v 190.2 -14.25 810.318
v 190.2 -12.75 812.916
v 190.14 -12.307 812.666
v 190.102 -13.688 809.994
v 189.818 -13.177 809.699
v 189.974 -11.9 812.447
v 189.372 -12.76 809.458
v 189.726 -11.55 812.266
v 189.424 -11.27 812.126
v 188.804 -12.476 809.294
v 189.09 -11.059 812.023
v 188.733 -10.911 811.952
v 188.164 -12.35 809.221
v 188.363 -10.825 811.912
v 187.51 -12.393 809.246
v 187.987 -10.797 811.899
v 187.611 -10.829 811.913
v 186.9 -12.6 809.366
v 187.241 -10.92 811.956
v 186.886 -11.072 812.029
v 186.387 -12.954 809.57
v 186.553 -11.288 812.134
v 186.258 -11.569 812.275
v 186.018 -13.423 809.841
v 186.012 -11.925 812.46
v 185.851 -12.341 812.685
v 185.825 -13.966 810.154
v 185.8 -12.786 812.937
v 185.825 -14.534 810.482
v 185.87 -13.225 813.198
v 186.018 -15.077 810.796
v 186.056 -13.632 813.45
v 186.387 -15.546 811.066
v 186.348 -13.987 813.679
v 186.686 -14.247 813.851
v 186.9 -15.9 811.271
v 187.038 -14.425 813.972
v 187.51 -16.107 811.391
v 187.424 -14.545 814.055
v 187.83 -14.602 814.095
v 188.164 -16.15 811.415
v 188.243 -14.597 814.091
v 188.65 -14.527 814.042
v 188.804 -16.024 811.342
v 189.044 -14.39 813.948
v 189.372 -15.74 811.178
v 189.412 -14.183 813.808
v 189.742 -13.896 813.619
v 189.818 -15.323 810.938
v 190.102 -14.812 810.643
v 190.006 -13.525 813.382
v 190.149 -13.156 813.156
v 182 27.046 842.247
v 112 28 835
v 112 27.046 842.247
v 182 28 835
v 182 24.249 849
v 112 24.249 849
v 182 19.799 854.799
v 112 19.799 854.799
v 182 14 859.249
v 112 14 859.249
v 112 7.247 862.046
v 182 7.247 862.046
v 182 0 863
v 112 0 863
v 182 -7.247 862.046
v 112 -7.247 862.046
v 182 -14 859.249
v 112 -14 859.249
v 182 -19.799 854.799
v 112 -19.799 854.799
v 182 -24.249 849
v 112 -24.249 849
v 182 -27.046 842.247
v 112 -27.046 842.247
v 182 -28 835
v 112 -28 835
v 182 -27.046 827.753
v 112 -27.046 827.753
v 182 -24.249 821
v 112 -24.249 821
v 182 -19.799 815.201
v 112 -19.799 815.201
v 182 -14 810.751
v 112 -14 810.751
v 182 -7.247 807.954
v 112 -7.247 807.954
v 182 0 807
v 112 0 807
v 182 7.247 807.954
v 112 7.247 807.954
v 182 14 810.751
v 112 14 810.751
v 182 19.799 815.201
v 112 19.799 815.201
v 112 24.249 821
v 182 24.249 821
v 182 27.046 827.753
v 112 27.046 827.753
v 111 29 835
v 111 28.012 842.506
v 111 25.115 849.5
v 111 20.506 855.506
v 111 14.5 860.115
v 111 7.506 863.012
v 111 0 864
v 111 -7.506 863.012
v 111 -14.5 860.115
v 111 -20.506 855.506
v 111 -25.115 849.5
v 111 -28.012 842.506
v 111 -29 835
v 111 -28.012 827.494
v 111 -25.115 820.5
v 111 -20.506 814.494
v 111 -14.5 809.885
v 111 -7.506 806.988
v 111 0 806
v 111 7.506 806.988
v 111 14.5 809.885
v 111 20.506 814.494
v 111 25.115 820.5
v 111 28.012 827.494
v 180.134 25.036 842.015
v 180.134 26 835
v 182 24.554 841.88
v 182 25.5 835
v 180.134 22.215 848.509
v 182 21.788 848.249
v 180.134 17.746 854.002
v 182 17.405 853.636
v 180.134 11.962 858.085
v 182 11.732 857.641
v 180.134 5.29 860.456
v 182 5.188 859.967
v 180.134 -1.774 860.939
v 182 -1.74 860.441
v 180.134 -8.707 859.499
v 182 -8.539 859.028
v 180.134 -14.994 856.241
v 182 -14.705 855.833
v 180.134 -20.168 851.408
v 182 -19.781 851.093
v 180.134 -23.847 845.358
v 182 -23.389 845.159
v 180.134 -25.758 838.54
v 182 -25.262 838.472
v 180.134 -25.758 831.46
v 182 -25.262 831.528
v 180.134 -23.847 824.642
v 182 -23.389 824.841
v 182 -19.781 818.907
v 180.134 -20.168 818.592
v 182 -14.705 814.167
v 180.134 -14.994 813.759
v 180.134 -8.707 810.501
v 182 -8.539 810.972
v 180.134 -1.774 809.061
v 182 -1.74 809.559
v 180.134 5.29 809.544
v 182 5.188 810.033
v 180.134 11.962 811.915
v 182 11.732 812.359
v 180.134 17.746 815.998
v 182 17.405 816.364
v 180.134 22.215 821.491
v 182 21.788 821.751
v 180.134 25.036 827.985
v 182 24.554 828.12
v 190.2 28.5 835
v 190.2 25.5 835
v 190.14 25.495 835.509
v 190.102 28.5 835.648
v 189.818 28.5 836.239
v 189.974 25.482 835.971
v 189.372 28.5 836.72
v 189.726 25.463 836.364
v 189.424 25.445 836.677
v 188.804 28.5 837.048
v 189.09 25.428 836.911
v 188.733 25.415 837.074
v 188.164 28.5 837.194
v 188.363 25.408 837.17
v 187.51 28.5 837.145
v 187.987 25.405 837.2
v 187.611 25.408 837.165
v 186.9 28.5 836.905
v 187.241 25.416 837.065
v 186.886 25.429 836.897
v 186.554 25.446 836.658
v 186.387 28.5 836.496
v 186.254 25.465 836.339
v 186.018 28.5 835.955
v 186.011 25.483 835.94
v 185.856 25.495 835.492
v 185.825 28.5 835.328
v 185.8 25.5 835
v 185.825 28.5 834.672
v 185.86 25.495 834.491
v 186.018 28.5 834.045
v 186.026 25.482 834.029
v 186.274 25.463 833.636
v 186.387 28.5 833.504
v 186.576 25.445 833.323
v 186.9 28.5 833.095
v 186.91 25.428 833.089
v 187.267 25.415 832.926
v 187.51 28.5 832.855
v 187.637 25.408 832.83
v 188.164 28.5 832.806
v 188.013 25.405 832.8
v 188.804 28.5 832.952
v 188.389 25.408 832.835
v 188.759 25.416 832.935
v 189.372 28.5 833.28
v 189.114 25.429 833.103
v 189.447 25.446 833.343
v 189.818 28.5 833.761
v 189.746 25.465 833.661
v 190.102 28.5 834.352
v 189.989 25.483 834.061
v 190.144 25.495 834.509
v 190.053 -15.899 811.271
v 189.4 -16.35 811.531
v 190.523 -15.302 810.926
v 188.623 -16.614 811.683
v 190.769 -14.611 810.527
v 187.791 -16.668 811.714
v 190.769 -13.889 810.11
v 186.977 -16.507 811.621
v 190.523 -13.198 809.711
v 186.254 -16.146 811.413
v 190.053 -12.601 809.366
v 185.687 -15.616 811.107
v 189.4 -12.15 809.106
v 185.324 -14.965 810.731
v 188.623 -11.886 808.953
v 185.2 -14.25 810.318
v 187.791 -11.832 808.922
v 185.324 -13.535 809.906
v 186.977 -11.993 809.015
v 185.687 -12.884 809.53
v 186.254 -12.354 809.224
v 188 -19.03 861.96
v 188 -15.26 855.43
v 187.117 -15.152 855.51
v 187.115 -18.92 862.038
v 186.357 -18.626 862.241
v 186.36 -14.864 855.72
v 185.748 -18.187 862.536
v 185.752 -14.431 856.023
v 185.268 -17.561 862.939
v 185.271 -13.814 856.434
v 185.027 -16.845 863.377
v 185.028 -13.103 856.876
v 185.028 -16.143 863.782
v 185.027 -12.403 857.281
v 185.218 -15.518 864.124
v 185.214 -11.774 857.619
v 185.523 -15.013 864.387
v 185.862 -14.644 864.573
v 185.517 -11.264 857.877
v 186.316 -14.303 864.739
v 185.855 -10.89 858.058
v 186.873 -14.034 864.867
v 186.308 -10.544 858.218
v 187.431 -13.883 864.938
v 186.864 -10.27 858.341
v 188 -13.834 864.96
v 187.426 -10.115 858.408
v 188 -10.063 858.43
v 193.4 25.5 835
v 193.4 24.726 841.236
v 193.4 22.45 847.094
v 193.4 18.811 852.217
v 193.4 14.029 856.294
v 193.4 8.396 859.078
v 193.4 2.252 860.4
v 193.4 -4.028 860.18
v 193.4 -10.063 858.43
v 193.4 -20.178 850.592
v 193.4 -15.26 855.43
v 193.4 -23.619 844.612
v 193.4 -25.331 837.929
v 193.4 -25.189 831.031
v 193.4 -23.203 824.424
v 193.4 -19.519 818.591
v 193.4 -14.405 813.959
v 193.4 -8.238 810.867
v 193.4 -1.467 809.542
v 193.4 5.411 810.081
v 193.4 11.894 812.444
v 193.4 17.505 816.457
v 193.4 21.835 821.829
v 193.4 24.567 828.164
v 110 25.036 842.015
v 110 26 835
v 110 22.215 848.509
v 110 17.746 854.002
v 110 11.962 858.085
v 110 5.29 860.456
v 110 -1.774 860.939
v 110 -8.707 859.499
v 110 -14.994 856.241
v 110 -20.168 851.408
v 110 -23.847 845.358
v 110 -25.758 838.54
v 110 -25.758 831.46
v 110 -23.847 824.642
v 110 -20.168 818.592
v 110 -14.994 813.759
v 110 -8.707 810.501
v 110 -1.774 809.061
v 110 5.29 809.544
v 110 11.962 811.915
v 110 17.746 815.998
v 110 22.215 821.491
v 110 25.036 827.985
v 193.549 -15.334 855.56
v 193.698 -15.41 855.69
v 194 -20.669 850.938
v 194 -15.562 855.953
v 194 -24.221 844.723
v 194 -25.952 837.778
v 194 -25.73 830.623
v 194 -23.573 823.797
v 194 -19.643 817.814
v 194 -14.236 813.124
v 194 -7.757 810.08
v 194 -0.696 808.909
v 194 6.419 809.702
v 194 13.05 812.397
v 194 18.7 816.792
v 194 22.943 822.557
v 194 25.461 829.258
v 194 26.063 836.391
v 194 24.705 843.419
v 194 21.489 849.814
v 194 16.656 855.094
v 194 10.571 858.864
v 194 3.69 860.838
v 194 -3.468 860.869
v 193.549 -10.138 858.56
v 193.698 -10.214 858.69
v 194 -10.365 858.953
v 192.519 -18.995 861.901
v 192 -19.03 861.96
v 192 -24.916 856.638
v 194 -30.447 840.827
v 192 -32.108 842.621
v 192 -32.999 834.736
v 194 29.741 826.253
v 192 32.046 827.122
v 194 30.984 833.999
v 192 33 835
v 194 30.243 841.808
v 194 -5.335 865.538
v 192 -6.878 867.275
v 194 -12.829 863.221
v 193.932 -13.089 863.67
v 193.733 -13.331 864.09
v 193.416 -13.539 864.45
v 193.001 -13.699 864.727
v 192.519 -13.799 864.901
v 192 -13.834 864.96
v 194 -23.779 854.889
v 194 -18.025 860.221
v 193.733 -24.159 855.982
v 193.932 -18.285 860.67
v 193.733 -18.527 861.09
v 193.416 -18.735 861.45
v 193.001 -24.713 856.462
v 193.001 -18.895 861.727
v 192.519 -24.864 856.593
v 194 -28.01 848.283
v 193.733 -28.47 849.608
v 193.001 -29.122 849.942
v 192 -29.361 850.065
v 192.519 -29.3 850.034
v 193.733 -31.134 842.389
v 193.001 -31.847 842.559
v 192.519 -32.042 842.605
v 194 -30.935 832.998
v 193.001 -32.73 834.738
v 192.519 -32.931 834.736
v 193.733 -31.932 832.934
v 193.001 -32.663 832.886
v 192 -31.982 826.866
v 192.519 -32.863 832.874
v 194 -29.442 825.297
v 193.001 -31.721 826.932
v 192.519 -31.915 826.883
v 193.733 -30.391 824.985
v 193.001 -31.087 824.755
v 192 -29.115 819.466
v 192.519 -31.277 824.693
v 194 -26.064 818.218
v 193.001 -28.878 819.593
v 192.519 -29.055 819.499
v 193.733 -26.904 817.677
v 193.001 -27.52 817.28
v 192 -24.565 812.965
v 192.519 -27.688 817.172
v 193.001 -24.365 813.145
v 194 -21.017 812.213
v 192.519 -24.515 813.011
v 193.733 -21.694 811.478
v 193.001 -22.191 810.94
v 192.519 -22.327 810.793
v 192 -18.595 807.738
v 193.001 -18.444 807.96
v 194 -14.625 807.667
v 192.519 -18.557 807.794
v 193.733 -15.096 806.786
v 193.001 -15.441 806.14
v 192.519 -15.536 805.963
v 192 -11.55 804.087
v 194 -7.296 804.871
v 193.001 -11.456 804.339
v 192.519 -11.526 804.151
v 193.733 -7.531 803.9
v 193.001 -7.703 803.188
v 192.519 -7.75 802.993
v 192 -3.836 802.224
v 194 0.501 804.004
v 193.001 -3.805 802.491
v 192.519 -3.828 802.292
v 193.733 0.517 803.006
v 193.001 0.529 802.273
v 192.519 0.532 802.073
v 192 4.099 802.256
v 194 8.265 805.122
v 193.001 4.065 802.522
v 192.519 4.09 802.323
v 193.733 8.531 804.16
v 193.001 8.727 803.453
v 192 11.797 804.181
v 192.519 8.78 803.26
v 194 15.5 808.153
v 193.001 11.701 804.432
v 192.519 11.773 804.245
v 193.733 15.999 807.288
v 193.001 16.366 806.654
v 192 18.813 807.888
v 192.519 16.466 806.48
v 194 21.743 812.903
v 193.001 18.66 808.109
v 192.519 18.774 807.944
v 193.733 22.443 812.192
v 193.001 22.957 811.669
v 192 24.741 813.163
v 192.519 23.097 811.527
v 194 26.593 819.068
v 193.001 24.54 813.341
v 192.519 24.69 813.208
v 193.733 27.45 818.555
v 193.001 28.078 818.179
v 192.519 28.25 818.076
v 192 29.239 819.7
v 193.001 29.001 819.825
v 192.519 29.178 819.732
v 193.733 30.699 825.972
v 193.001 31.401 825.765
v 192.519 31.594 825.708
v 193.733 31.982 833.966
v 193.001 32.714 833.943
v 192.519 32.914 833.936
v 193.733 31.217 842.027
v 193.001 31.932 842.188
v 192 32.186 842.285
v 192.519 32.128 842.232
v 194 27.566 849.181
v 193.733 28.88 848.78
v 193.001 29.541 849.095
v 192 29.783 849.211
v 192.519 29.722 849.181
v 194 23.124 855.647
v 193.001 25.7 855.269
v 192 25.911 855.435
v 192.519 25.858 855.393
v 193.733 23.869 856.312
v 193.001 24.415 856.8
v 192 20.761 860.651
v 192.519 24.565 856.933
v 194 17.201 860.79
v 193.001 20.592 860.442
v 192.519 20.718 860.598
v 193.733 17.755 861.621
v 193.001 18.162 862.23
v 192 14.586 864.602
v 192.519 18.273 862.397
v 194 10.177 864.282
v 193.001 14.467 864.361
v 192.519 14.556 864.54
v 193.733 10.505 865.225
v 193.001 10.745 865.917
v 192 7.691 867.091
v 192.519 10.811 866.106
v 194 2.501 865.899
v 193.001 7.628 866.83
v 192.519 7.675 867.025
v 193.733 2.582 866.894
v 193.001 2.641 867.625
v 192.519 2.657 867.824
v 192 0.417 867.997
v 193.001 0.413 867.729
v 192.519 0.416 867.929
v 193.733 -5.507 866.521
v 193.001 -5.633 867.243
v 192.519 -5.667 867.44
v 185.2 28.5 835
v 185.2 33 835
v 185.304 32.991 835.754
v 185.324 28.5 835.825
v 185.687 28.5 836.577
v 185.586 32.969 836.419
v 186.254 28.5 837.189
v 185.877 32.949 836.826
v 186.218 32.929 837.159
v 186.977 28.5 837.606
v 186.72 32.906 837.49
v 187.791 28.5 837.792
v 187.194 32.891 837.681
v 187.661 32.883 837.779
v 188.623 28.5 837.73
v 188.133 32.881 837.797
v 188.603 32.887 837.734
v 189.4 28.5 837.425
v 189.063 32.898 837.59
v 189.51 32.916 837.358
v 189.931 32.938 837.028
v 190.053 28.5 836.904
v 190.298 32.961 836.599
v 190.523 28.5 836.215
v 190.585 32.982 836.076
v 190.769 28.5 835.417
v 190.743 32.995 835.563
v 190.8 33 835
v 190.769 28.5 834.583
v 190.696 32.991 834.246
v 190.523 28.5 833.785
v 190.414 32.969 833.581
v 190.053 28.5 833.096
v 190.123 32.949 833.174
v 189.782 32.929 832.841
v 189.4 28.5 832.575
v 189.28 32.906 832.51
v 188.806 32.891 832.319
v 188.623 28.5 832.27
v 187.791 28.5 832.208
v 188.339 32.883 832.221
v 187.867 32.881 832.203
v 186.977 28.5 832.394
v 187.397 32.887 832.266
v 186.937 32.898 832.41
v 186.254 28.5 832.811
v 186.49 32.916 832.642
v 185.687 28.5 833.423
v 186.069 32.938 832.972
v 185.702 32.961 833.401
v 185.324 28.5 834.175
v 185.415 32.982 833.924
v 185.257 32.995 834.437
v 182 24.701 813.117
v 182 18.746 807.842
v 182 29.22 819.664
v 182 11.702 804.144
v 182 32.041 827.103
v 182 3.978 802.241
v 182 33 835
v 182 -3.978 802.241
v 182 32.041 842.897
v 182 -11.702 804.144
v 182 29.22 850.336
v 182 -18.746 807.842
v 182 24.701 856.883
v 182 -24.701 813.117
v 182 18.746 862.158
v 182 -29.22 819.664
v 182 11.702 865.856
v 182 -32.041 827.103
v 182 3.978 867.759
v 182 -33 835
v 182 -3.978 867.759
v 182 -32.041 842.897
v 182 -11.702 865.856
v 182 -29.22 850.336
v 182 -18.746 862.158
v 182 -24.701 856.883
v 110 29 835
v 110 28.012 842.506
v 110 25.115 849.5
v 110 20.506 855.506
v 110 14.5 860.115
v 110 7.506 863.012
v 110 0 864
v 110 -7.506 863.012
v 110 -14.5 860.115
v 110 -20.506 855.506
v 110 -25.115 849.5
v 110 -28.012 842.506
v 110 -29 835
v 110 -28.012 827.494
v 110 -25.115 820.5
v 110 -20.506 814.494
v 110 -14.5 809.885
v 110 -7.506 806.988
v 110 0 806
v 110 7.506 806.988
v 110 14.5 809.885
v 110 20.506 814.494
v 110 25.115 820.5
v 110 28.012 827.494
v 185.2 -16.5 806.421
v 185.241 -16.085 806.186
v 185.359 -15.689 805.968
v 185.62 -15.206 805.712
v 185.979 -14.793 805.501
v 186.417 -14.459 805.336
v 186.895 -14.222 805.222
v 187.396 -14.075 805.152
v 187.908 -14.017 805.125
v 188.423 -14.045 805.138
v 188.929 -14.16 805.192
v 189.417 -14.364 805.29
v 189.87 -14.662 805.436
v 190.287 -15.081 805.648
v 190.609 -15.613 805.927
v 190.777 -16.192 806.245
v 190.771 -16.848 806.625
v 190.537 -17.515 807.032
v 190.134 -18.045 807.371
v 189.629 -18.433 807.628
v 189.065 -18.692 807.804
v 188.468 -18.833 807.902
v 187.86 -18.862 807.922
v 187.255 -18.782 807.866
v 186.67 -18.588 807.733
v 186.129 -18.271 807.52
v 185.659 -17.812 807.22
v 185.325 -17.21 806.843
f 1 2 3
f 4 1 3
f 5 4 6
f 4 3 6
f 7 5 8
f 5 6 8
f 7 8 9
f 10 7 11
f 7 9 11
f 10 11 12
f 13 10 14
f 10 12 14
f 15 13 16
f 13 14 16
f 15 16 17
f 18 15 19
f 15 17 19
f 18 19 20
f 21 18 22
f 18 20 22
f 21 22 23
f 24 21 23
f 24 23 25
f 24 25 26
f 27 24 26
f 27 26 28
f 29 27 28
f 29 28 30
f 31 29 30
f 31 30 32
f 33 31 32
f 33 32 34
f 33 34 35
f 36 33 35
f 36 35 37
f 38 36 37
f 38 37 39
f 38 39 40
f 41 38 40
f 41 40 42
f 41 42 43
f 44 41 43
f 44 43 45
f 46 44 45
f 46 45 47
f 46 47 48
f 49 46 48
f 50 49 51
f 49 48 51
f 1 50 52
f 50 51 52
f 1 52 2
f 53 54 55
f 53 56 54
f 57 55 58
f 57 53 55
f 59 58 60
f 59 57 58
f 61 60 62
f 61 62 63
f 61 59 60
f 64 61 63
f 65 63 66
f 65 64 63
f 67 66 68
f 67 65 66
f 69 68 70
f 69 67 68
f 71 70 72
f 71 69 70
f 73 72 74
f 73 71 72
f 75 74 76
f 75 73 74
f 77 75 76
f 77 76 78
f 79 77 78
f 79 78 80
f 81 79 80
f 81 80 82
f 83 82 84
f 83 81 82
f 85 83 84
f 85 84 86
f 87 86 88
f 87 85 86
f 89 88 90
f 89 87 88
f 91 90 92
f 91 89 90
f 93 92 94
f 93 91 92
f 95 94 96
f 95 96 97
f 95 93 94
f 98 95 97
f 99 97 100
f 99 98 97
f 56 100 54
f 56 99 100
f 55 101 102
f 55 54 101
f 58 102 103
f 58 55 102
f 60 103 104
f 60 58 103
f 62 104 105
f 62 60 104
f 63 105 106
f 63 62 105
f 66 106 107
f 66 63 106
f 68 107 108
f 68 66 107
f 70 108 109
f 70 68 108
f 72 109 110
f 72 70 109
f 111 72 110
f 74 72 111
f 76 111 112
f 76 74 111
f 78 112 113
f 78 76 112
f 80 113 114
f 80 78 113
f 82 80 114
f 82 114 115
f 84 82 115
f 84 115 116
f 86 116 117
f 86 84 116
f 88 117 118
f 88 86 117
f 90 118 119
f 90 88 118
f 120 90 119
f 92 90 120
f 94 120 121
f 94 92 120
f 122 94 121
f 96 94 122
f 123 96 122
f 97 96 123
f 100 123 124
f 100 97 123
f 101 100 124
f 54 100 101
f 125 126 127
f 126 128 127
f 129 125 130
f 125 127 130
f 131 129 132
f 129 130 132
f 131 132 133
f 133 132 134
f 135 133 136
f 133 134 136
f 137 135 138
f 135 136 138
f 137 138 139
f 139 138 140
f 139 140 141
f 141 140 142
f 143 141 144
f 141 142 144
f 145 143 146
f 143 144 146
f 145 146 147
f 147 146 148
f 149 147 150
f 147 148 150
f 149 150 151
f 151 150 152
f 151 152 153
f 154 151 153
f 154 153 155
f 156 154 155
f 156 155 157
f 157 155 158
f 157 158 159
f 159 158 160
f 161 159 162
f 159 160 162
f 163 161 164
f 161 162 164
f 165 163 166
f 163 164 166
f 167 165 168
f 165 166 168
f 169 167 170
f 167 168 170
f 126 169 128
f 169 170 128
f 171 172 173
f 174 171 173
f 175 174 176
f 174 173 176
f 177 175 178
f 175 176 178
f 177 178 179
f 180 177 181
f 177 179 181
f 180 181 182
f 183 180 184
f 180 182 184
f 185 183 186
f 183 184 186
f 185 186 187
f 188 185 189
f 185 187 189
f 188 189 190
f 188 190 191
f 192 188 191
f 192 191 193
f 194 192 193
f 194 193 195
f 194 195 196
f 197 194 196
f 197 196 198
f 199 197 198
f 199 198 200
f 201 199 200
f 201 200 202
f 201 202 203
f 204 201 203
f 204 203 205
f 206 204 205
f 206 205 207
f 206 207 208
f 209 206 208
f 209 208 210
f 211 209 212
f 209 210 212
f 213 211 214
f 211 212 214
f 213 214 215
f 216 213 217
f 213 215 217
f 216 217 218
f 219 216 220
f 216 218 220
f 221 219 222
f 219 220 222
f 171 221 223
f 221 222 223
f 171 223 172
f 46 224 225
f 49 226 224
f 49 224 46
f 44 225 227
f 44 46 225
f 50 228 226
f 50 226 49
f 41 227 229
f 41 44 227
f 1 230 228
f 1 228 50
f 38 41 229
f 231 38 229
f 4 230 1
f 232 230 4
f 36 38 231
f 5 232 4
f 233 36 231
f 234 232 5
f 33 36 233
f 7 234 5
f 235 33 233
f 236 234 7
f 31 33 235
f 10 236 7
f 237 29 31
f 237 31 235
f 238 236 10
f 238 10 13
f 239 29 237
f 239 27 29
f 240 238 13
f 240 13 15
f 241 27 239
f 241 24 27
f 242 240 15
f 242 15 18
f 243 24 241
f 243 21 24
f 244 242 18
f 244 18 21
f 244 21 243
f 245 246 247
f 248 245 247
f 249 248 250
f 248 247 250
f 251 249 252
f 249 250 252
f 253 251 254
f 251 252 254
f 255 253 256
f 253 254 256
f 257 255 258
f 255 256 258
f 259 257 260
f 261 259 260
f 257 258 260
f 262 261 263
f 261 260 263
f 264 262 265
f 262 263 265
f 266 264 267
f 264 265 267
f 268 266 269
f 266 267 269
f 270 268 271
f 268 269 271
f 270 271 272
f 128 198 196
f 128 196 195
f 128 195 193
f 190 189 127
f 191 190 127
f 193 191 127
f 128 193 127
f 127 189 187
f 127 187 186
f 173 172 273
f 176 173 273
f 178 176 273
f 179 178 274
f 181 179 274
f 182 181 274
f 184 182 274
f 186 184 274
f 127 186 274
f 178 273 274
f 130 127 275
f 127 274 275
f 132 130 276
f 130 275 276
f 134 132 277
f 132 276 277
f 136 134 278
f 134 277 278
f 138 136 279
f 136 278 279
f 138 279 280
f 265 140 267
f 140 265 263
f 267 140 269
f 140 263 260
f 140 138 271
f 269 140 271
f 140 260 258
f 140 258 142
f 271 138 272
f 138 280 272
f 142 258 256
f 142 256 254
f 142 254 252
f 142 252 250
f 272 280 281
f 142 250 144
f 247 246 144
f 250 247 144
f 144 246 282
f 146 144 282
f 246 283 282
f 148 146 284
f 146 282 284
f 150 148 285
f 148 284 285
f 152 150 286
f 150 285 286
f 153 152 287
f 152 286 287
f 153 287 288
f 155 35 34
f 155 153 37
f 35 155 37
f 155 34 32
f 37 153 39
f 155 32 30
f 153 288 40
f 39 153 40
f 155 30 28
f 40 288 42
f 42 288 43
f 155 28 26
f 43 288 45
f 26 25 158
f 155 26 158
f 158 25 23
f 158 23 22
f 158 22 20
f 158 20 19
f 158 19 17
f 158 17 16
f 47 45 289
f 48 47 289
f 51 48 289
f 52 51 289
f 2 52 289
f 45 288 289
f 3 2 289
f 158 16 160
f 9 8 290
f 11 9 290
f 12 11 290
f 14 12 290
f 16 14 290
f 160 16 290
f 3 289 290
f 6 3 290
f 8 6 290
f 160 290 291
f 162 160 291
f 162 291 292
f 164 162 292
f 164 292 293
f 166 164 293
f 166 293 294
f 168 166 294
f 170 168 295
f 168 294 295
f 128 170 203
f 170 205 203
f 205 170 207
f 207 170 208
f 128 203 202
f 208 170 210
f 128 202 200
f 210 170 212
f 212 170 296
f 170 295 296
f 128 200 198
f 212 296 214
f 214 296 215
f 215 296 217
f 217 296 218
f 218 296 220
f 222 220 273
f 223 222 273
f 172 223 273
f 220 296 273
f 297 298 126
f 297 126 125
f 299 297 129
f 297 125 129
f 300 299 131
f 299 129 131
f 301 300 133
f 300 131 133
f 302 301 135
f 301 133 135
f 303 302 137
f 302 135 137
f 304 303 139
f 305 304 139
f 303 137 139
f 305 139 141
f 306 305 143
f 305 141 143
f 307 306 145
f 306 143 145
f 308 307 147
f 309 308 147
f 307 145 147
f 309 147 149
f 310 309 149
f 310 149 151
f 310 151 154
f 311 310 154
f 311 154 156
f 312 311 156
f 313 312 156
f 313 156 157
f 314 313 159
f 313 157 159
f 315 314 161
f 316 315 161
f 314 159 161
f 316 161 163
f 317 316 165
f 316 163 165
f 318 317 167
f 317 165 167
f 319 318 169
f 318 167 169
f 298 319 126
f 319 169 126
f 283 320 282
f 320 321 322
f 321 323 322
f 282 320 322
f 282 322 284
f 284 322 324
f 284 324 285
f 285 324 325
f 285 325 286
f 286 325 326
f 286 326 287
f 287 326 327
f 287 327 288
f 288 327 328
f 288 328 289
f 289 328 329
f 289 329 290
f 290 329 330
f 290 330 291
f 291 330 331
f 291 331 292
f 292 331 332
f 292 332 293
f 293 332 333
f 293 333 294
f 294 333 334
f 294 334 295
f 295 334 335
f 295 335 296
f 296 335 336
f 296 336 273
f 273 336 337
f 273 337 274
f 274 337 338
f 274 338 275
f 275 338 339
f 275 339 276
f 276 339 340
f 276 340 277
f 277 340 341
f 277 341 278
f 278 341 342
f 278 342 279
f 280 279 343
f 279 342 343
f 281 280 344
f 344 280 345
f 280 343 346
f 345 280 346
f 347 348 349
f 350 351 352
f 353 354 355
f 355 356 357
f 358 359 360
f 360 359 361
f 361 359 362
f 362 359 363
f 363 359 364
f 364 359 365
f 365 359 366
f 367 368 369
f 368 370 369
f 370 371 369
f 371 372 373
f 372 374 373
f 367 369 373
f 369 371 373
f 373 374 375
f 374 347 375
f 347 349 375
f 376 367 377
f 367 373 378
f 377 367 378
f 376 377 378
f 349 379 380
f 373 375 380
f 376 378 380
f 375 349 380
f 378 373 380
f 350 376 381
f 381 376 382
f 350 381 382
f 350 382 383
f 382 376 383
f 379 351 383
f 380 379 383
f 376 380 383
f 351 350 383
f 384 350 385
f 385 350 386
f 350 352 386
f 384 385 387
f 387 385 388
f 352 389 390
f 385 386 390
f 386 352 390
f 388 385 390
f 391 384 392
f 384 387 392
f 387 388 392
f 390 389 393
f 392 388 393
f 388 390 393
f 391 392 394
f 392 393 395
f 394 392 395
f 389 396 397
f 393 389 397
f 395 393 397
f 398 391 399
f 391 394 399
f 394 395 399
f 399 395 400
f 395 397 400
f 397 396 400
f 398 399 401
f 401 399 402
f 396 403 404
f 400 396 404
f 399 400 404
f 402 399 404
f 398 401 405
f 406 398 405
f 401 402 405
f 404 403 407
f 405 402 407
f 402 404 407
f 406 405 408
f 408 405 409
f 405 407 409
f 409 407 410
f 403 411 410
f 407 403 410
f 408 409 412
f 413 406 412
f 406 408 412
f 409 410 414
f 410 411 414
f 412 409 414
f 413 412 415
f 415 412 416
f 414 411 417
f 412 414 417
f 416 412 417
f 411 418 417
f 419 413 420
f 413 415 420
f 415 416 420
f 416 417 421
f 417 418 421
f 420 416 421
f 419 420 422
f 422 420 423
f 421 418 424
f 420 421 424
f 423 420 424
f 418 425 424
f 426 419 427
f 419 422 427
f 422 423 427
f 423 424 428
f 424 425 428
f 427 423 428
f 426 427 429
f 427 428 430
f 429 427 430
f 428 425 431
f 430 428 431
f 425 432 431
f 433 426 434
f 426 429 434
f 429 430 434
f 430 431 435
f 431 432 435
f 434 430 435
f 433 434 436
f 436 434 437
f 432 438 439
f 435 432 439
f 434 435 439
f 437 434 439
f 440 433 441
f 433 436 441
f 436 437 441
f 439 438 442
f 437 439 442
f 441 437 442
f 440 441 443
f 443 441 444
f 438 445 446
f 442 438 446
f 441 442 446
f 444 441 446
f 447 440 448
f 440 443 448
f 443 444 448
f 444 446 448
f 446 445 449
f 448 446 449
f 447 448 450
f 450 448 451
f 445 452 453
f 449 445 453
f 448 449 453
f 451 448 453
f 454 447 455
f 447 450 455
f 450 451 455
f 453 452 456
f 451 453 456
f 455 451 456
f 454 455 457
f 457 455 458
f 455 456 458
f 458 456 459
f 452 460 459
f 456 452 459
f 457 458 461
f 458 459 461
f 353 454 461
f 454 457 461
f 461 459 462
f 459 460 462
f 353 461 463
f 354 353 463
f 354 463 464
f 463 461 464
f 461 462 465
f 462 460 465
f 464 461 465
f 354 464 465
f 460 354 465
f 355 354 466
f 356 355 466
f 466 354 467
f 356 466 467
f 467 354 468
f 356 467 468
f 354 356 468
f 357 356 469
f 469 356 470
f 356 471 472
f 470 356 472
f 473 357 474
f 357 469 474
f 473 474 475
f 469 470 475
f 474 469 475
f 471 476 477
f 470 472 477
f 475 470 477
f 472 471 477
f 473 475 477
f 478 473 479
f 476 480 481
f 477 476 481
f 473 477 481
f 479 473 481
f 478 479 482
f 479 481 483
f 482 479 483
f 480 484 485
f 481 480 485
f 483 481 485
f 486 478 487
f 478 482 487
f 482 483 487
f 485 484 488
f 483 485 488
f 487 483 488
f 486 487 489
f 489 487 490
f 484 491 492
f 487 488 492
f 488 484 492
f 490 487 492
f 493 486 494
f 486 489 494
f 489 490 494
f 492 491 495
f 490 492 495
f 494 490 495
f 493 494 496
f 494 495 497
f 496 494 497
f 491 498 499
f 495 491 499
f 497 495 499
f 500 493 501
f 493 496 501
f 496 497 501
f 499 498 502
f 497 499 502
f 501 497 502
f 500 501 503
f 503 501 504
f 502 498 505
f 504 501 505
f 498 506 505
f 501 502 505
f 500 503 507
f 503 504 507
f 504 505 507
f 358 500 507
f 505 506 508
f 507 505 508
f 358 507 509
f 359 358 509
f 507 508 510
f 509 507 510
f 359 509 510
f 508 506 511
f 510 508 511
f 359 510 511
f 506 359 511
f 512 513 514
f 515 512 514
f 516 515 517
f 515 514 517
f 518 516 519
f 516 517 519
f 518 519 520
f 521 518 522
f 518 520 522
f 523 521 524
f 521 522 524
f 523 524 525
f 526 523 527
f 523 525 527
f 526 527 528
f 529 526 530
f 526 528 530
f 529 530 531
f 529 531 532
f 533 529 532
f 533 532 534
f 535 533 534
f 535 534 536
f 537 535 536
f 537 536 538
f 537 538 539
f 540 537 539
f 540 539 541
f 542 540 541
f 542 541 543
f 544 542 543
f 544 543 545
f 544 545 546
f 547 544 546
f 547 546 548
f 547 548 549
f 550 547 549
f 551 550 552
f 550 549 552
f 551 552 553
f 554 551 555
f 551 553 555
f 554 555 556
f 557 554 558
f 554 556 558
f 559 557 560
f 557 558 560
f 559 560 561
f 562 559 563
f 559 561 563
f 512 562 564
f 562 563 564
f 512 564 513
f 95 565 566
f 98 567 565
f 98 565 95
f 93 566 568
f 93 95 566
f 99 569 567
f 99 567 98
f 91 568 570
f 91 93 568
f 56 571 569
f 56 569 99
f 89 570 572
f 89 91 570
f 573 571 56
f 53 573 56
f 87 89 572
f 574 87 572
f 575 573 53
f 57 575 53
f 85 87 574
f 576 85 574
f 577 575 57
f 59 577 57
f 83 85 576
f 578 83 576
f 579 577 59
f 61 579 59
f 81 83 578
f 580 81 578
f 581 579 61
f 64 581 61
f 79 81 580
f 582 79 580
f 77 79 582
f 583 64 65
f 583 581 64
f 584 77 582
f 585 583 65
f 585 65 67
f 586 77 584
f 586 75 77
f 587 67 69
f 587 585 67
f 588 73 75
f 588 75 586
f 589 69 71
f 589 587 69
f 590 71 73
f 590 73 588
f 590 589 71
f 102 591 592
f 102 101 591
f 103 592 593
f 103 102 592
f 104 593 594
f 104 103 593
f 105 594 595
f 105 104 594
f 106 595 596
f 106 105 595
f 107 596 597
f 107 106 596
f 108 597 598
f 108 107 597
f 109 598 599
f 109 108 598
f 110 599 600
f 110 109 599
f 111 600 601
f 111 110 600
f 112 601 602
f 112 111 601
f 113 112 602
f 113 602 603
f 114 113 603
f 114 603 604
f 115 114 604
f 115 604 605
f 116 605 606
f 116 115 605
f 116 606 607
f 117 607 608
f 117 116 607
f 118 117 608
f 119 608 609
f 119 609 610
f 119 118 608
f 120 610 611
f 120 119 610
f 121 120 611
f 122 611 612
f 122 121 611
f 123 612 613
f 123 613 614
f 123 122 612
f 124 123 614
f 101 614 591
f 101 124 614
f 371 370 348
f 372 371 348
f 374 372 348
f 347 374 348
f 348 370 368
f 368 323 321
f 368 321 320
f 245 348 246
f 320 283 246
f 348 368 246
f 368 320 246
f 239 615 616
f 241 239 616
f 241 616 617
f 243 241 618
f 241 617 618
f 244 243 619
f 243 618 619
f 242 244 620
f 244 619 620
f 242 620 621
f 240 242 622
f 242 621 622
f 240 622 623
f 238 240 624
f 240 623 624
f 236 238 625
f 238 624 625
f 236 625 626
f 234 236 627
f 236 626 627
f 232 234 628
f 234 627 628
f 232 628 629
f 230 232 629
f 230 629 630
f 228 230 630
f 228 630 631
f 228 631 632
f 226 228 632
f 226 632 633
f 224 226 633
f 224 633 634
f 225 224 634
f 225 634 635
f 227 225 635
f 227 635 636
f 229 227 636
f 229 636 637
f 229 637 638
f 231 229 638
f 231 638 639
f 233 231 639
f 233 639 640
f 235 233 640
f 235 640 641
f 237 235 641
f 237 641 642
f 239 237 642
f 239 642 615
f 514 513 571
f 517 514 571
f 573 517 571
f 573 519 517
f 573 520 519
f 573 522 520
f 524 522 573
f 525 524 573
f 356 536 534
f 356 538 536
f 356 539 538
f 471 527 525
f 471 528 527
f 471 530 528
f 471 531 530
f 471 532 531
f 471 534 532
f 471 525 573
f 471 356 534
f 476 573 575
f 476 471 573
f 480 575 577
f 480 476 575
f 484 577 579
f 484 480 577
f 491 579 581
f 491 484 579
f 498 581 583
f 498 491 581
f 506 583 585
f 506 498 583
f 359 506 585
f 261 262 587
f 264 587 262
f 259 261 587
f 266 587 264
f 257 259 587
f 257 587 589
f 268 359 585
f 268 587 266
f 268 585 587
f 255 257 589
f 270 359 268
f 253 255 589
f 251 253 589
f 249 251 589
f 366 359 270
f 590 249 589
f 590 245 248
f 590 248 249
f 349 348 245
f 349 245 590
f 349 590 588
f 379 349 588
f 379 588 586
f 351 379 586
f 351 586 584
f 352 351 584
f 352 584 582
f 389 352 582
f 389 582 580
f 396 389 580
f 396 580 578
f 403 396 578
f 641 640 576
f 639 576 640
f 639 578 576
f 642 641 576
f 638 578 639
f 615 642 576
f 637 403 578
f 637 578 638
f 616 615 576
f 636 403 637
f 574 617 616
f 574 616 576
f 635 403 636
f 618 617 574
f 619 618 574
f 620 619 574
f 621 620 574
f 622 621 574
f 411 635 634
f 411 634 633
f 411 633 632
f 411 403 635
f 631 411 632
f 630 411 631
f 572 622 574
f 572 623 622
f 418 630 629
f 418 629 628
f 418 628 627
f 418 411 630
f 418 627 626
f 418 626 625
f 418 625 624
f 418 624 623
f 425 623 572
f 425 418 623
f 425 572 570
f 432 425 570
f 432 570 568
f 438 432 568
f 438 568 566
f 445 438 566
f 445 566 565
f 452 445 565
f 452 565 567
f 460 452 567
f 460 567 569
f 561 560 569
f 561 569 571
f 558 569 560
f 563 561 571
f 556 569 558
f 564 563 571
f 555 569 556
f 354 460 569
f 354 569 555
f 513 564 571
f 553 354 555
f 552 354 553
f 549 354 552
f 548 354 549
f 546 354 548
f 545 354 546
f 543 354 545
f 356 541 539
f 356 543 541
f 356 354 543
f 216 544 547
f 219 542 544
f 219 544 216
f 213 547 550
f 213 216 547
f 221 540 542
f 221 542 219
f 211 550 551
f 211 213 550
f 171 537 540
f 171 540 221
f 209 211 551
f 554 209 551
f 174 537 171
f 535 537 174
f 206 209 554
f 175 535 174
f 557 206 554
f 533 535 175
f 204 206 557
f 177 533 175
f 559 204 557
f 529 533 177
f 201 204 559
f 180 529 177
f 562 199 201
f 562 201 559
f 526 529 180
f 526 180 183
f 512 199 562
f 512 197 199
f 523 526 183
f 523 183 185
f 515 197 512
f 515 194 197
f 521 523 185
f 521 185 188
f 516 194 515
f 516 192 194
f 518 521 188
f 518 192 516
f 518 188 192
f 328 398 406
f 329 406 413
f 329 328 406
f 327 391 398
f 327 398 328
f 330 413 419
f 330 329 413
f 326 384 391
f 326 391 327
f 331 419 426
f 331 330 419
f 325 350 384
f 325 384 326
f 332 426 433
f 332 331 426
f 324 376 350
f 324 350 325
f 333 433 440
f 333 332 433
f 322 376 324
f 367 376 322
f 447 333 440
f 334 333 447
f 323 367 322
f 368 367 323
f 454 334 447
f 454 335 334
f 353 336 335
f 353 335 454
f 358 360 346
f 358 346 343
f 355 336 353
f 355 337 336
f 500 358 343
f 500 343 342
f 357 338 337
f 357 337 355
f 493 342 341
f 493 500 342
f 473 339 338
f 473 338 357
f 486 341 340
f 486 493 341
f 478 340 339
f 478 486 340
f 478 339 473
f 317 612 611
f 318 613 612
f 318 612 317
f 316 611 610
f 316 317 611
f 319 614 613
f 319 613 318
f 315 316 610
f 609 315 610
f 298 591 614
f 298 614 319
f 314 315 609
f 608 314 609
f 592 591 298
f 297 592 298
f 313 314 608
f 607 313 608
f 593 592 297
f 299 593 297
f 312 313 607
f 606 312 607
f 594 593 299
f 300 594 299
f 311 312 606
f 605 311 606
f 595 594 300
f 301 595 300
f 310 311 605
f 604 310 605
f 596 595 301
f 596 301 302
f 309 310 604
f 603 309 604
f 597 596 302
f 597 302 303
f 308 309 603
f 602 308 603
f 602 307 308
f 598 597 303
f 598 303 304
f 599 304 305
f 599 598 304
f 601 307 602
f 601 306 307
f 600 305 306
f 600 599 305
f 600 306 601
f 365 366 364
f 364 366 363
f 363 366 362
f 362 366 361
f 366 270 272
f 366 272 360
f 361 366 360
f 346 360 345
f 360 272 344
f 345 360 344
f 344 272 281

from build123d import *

# Parameters (mm, degrees)
SKETCH031_R           = 2.8
POCKET195_DEPTH       = 4.5
SKETCH032_R           = 2.2
POCKET196_DEPTH       = 284.142395
POLARPATTERN008_COUNT = 2
POLARPATTERN008_ANGLE = 120
POCKET197_DEPTH       = 20.679838
CHAMFER001_SIZE       = 0.6


with BuildPart() as part:
    # Sketch022 → Revolution001 (revolve)
    with BuildSketch(Plane.XY):
        with BuildLine():
            Line((0, 26), (70.133975, 26))
            Line((70.133975, 26), (72, 25.5))
            Line((72, 25.5), (84, 25.5))
            Line((84, 31), (84, 25.5))
            ThreePointArc((84, 31), (83.414214, 32.414214), (82, 33))
            Line((72, 33), (82, 33))
            Line((72, 28), (72, 33))
            Line((2, 28), (72, 28))
            Line((1, 29), (2, 28))
            Line((0, 29), (1, 29))
            Line((0, 26), (0, 29))
        make_face()
    revolve(axis=Axis((0, 0, 0), (1, 0, 0)))

    # Sketch031 (on DatumPlane) → Pocket195 (cut)
    with BuildSketch(Plane(origin=(78, 33, 0), x_dir=(-1, 0, 0), z_dir=(0, 1, 0))):
        Circle(SKETCH031_R)
    pocket195 = extrude(amount=-POCKET195_DEPTH, mode=Mode.SUBTRACT)

    # Sketch032 (on DatumPlane) → Pocket196 (cut, through all)
    with BuildSketch(Plane(origin=(78, 0, 0), x_dir=(1, 0, 0), z_dir=(0, -1, 0))):
        Circle(SKETCH032_R)
    pocket196 = extrude(amount=-POCKET196_DEPTH, mode=Mode.SUBTRACT)

    # PolarPattern008: Pocket195, Pocket196 ×2 about axis
    polarpattern008_axis = Axis((0, 0, 0), (-1, 0, 0))
    for i in range(1, POLARPATTERN008_COUNT):
        add(pocket195.rotate(polarpattern008_axis, i * POLARPATTERN008_ANGLE / (POLARPATTERN008_COUNT - 1)), mode=Mode.SUBTRACT)
        add(pocket196.rotate(polarpattern008_axis, i * POLARPATTERN008_ANGLE / (POLARPATTERN008_COUNT - 1)), mode=Mode.SUBTRACT)

    # Sketch146 (on DatumPlane) → Pocket197 (cut, through all)
    with BuildSketch(Plane(origin=(78, -12.2, 21.13102), x_dir=(1, 0, 0), z_dir=(0, 0.5, -0.866025))):
        with BuildLine():
            Line((7, 3), (0, 3))
            ThreePointArc((0, 3), (-3, 0), (0, -3))
            Line((0, -3), (7, -3))
            Line((7, -3), (7, 3))
        make_face()
    extrude(amount=-POCKET197_DEPTH, mode=Mode.SUBTRACT)

    # Chamfer001
    chamfer001_edges = [part.edges().sort_by_distance(p)[0] for p in [
        (84, 14.029144, 21.293969),
        (84, -11.426546, -22.79658),
    ]]
    chamfer(chamfer001_edges, length=CHAMFER001_SIZE)


with BuildPart() as part_1:
    # Body007 placement: moved
    add(part.part.moved(Location((110, 0, 835))))


solid = part_1.part
